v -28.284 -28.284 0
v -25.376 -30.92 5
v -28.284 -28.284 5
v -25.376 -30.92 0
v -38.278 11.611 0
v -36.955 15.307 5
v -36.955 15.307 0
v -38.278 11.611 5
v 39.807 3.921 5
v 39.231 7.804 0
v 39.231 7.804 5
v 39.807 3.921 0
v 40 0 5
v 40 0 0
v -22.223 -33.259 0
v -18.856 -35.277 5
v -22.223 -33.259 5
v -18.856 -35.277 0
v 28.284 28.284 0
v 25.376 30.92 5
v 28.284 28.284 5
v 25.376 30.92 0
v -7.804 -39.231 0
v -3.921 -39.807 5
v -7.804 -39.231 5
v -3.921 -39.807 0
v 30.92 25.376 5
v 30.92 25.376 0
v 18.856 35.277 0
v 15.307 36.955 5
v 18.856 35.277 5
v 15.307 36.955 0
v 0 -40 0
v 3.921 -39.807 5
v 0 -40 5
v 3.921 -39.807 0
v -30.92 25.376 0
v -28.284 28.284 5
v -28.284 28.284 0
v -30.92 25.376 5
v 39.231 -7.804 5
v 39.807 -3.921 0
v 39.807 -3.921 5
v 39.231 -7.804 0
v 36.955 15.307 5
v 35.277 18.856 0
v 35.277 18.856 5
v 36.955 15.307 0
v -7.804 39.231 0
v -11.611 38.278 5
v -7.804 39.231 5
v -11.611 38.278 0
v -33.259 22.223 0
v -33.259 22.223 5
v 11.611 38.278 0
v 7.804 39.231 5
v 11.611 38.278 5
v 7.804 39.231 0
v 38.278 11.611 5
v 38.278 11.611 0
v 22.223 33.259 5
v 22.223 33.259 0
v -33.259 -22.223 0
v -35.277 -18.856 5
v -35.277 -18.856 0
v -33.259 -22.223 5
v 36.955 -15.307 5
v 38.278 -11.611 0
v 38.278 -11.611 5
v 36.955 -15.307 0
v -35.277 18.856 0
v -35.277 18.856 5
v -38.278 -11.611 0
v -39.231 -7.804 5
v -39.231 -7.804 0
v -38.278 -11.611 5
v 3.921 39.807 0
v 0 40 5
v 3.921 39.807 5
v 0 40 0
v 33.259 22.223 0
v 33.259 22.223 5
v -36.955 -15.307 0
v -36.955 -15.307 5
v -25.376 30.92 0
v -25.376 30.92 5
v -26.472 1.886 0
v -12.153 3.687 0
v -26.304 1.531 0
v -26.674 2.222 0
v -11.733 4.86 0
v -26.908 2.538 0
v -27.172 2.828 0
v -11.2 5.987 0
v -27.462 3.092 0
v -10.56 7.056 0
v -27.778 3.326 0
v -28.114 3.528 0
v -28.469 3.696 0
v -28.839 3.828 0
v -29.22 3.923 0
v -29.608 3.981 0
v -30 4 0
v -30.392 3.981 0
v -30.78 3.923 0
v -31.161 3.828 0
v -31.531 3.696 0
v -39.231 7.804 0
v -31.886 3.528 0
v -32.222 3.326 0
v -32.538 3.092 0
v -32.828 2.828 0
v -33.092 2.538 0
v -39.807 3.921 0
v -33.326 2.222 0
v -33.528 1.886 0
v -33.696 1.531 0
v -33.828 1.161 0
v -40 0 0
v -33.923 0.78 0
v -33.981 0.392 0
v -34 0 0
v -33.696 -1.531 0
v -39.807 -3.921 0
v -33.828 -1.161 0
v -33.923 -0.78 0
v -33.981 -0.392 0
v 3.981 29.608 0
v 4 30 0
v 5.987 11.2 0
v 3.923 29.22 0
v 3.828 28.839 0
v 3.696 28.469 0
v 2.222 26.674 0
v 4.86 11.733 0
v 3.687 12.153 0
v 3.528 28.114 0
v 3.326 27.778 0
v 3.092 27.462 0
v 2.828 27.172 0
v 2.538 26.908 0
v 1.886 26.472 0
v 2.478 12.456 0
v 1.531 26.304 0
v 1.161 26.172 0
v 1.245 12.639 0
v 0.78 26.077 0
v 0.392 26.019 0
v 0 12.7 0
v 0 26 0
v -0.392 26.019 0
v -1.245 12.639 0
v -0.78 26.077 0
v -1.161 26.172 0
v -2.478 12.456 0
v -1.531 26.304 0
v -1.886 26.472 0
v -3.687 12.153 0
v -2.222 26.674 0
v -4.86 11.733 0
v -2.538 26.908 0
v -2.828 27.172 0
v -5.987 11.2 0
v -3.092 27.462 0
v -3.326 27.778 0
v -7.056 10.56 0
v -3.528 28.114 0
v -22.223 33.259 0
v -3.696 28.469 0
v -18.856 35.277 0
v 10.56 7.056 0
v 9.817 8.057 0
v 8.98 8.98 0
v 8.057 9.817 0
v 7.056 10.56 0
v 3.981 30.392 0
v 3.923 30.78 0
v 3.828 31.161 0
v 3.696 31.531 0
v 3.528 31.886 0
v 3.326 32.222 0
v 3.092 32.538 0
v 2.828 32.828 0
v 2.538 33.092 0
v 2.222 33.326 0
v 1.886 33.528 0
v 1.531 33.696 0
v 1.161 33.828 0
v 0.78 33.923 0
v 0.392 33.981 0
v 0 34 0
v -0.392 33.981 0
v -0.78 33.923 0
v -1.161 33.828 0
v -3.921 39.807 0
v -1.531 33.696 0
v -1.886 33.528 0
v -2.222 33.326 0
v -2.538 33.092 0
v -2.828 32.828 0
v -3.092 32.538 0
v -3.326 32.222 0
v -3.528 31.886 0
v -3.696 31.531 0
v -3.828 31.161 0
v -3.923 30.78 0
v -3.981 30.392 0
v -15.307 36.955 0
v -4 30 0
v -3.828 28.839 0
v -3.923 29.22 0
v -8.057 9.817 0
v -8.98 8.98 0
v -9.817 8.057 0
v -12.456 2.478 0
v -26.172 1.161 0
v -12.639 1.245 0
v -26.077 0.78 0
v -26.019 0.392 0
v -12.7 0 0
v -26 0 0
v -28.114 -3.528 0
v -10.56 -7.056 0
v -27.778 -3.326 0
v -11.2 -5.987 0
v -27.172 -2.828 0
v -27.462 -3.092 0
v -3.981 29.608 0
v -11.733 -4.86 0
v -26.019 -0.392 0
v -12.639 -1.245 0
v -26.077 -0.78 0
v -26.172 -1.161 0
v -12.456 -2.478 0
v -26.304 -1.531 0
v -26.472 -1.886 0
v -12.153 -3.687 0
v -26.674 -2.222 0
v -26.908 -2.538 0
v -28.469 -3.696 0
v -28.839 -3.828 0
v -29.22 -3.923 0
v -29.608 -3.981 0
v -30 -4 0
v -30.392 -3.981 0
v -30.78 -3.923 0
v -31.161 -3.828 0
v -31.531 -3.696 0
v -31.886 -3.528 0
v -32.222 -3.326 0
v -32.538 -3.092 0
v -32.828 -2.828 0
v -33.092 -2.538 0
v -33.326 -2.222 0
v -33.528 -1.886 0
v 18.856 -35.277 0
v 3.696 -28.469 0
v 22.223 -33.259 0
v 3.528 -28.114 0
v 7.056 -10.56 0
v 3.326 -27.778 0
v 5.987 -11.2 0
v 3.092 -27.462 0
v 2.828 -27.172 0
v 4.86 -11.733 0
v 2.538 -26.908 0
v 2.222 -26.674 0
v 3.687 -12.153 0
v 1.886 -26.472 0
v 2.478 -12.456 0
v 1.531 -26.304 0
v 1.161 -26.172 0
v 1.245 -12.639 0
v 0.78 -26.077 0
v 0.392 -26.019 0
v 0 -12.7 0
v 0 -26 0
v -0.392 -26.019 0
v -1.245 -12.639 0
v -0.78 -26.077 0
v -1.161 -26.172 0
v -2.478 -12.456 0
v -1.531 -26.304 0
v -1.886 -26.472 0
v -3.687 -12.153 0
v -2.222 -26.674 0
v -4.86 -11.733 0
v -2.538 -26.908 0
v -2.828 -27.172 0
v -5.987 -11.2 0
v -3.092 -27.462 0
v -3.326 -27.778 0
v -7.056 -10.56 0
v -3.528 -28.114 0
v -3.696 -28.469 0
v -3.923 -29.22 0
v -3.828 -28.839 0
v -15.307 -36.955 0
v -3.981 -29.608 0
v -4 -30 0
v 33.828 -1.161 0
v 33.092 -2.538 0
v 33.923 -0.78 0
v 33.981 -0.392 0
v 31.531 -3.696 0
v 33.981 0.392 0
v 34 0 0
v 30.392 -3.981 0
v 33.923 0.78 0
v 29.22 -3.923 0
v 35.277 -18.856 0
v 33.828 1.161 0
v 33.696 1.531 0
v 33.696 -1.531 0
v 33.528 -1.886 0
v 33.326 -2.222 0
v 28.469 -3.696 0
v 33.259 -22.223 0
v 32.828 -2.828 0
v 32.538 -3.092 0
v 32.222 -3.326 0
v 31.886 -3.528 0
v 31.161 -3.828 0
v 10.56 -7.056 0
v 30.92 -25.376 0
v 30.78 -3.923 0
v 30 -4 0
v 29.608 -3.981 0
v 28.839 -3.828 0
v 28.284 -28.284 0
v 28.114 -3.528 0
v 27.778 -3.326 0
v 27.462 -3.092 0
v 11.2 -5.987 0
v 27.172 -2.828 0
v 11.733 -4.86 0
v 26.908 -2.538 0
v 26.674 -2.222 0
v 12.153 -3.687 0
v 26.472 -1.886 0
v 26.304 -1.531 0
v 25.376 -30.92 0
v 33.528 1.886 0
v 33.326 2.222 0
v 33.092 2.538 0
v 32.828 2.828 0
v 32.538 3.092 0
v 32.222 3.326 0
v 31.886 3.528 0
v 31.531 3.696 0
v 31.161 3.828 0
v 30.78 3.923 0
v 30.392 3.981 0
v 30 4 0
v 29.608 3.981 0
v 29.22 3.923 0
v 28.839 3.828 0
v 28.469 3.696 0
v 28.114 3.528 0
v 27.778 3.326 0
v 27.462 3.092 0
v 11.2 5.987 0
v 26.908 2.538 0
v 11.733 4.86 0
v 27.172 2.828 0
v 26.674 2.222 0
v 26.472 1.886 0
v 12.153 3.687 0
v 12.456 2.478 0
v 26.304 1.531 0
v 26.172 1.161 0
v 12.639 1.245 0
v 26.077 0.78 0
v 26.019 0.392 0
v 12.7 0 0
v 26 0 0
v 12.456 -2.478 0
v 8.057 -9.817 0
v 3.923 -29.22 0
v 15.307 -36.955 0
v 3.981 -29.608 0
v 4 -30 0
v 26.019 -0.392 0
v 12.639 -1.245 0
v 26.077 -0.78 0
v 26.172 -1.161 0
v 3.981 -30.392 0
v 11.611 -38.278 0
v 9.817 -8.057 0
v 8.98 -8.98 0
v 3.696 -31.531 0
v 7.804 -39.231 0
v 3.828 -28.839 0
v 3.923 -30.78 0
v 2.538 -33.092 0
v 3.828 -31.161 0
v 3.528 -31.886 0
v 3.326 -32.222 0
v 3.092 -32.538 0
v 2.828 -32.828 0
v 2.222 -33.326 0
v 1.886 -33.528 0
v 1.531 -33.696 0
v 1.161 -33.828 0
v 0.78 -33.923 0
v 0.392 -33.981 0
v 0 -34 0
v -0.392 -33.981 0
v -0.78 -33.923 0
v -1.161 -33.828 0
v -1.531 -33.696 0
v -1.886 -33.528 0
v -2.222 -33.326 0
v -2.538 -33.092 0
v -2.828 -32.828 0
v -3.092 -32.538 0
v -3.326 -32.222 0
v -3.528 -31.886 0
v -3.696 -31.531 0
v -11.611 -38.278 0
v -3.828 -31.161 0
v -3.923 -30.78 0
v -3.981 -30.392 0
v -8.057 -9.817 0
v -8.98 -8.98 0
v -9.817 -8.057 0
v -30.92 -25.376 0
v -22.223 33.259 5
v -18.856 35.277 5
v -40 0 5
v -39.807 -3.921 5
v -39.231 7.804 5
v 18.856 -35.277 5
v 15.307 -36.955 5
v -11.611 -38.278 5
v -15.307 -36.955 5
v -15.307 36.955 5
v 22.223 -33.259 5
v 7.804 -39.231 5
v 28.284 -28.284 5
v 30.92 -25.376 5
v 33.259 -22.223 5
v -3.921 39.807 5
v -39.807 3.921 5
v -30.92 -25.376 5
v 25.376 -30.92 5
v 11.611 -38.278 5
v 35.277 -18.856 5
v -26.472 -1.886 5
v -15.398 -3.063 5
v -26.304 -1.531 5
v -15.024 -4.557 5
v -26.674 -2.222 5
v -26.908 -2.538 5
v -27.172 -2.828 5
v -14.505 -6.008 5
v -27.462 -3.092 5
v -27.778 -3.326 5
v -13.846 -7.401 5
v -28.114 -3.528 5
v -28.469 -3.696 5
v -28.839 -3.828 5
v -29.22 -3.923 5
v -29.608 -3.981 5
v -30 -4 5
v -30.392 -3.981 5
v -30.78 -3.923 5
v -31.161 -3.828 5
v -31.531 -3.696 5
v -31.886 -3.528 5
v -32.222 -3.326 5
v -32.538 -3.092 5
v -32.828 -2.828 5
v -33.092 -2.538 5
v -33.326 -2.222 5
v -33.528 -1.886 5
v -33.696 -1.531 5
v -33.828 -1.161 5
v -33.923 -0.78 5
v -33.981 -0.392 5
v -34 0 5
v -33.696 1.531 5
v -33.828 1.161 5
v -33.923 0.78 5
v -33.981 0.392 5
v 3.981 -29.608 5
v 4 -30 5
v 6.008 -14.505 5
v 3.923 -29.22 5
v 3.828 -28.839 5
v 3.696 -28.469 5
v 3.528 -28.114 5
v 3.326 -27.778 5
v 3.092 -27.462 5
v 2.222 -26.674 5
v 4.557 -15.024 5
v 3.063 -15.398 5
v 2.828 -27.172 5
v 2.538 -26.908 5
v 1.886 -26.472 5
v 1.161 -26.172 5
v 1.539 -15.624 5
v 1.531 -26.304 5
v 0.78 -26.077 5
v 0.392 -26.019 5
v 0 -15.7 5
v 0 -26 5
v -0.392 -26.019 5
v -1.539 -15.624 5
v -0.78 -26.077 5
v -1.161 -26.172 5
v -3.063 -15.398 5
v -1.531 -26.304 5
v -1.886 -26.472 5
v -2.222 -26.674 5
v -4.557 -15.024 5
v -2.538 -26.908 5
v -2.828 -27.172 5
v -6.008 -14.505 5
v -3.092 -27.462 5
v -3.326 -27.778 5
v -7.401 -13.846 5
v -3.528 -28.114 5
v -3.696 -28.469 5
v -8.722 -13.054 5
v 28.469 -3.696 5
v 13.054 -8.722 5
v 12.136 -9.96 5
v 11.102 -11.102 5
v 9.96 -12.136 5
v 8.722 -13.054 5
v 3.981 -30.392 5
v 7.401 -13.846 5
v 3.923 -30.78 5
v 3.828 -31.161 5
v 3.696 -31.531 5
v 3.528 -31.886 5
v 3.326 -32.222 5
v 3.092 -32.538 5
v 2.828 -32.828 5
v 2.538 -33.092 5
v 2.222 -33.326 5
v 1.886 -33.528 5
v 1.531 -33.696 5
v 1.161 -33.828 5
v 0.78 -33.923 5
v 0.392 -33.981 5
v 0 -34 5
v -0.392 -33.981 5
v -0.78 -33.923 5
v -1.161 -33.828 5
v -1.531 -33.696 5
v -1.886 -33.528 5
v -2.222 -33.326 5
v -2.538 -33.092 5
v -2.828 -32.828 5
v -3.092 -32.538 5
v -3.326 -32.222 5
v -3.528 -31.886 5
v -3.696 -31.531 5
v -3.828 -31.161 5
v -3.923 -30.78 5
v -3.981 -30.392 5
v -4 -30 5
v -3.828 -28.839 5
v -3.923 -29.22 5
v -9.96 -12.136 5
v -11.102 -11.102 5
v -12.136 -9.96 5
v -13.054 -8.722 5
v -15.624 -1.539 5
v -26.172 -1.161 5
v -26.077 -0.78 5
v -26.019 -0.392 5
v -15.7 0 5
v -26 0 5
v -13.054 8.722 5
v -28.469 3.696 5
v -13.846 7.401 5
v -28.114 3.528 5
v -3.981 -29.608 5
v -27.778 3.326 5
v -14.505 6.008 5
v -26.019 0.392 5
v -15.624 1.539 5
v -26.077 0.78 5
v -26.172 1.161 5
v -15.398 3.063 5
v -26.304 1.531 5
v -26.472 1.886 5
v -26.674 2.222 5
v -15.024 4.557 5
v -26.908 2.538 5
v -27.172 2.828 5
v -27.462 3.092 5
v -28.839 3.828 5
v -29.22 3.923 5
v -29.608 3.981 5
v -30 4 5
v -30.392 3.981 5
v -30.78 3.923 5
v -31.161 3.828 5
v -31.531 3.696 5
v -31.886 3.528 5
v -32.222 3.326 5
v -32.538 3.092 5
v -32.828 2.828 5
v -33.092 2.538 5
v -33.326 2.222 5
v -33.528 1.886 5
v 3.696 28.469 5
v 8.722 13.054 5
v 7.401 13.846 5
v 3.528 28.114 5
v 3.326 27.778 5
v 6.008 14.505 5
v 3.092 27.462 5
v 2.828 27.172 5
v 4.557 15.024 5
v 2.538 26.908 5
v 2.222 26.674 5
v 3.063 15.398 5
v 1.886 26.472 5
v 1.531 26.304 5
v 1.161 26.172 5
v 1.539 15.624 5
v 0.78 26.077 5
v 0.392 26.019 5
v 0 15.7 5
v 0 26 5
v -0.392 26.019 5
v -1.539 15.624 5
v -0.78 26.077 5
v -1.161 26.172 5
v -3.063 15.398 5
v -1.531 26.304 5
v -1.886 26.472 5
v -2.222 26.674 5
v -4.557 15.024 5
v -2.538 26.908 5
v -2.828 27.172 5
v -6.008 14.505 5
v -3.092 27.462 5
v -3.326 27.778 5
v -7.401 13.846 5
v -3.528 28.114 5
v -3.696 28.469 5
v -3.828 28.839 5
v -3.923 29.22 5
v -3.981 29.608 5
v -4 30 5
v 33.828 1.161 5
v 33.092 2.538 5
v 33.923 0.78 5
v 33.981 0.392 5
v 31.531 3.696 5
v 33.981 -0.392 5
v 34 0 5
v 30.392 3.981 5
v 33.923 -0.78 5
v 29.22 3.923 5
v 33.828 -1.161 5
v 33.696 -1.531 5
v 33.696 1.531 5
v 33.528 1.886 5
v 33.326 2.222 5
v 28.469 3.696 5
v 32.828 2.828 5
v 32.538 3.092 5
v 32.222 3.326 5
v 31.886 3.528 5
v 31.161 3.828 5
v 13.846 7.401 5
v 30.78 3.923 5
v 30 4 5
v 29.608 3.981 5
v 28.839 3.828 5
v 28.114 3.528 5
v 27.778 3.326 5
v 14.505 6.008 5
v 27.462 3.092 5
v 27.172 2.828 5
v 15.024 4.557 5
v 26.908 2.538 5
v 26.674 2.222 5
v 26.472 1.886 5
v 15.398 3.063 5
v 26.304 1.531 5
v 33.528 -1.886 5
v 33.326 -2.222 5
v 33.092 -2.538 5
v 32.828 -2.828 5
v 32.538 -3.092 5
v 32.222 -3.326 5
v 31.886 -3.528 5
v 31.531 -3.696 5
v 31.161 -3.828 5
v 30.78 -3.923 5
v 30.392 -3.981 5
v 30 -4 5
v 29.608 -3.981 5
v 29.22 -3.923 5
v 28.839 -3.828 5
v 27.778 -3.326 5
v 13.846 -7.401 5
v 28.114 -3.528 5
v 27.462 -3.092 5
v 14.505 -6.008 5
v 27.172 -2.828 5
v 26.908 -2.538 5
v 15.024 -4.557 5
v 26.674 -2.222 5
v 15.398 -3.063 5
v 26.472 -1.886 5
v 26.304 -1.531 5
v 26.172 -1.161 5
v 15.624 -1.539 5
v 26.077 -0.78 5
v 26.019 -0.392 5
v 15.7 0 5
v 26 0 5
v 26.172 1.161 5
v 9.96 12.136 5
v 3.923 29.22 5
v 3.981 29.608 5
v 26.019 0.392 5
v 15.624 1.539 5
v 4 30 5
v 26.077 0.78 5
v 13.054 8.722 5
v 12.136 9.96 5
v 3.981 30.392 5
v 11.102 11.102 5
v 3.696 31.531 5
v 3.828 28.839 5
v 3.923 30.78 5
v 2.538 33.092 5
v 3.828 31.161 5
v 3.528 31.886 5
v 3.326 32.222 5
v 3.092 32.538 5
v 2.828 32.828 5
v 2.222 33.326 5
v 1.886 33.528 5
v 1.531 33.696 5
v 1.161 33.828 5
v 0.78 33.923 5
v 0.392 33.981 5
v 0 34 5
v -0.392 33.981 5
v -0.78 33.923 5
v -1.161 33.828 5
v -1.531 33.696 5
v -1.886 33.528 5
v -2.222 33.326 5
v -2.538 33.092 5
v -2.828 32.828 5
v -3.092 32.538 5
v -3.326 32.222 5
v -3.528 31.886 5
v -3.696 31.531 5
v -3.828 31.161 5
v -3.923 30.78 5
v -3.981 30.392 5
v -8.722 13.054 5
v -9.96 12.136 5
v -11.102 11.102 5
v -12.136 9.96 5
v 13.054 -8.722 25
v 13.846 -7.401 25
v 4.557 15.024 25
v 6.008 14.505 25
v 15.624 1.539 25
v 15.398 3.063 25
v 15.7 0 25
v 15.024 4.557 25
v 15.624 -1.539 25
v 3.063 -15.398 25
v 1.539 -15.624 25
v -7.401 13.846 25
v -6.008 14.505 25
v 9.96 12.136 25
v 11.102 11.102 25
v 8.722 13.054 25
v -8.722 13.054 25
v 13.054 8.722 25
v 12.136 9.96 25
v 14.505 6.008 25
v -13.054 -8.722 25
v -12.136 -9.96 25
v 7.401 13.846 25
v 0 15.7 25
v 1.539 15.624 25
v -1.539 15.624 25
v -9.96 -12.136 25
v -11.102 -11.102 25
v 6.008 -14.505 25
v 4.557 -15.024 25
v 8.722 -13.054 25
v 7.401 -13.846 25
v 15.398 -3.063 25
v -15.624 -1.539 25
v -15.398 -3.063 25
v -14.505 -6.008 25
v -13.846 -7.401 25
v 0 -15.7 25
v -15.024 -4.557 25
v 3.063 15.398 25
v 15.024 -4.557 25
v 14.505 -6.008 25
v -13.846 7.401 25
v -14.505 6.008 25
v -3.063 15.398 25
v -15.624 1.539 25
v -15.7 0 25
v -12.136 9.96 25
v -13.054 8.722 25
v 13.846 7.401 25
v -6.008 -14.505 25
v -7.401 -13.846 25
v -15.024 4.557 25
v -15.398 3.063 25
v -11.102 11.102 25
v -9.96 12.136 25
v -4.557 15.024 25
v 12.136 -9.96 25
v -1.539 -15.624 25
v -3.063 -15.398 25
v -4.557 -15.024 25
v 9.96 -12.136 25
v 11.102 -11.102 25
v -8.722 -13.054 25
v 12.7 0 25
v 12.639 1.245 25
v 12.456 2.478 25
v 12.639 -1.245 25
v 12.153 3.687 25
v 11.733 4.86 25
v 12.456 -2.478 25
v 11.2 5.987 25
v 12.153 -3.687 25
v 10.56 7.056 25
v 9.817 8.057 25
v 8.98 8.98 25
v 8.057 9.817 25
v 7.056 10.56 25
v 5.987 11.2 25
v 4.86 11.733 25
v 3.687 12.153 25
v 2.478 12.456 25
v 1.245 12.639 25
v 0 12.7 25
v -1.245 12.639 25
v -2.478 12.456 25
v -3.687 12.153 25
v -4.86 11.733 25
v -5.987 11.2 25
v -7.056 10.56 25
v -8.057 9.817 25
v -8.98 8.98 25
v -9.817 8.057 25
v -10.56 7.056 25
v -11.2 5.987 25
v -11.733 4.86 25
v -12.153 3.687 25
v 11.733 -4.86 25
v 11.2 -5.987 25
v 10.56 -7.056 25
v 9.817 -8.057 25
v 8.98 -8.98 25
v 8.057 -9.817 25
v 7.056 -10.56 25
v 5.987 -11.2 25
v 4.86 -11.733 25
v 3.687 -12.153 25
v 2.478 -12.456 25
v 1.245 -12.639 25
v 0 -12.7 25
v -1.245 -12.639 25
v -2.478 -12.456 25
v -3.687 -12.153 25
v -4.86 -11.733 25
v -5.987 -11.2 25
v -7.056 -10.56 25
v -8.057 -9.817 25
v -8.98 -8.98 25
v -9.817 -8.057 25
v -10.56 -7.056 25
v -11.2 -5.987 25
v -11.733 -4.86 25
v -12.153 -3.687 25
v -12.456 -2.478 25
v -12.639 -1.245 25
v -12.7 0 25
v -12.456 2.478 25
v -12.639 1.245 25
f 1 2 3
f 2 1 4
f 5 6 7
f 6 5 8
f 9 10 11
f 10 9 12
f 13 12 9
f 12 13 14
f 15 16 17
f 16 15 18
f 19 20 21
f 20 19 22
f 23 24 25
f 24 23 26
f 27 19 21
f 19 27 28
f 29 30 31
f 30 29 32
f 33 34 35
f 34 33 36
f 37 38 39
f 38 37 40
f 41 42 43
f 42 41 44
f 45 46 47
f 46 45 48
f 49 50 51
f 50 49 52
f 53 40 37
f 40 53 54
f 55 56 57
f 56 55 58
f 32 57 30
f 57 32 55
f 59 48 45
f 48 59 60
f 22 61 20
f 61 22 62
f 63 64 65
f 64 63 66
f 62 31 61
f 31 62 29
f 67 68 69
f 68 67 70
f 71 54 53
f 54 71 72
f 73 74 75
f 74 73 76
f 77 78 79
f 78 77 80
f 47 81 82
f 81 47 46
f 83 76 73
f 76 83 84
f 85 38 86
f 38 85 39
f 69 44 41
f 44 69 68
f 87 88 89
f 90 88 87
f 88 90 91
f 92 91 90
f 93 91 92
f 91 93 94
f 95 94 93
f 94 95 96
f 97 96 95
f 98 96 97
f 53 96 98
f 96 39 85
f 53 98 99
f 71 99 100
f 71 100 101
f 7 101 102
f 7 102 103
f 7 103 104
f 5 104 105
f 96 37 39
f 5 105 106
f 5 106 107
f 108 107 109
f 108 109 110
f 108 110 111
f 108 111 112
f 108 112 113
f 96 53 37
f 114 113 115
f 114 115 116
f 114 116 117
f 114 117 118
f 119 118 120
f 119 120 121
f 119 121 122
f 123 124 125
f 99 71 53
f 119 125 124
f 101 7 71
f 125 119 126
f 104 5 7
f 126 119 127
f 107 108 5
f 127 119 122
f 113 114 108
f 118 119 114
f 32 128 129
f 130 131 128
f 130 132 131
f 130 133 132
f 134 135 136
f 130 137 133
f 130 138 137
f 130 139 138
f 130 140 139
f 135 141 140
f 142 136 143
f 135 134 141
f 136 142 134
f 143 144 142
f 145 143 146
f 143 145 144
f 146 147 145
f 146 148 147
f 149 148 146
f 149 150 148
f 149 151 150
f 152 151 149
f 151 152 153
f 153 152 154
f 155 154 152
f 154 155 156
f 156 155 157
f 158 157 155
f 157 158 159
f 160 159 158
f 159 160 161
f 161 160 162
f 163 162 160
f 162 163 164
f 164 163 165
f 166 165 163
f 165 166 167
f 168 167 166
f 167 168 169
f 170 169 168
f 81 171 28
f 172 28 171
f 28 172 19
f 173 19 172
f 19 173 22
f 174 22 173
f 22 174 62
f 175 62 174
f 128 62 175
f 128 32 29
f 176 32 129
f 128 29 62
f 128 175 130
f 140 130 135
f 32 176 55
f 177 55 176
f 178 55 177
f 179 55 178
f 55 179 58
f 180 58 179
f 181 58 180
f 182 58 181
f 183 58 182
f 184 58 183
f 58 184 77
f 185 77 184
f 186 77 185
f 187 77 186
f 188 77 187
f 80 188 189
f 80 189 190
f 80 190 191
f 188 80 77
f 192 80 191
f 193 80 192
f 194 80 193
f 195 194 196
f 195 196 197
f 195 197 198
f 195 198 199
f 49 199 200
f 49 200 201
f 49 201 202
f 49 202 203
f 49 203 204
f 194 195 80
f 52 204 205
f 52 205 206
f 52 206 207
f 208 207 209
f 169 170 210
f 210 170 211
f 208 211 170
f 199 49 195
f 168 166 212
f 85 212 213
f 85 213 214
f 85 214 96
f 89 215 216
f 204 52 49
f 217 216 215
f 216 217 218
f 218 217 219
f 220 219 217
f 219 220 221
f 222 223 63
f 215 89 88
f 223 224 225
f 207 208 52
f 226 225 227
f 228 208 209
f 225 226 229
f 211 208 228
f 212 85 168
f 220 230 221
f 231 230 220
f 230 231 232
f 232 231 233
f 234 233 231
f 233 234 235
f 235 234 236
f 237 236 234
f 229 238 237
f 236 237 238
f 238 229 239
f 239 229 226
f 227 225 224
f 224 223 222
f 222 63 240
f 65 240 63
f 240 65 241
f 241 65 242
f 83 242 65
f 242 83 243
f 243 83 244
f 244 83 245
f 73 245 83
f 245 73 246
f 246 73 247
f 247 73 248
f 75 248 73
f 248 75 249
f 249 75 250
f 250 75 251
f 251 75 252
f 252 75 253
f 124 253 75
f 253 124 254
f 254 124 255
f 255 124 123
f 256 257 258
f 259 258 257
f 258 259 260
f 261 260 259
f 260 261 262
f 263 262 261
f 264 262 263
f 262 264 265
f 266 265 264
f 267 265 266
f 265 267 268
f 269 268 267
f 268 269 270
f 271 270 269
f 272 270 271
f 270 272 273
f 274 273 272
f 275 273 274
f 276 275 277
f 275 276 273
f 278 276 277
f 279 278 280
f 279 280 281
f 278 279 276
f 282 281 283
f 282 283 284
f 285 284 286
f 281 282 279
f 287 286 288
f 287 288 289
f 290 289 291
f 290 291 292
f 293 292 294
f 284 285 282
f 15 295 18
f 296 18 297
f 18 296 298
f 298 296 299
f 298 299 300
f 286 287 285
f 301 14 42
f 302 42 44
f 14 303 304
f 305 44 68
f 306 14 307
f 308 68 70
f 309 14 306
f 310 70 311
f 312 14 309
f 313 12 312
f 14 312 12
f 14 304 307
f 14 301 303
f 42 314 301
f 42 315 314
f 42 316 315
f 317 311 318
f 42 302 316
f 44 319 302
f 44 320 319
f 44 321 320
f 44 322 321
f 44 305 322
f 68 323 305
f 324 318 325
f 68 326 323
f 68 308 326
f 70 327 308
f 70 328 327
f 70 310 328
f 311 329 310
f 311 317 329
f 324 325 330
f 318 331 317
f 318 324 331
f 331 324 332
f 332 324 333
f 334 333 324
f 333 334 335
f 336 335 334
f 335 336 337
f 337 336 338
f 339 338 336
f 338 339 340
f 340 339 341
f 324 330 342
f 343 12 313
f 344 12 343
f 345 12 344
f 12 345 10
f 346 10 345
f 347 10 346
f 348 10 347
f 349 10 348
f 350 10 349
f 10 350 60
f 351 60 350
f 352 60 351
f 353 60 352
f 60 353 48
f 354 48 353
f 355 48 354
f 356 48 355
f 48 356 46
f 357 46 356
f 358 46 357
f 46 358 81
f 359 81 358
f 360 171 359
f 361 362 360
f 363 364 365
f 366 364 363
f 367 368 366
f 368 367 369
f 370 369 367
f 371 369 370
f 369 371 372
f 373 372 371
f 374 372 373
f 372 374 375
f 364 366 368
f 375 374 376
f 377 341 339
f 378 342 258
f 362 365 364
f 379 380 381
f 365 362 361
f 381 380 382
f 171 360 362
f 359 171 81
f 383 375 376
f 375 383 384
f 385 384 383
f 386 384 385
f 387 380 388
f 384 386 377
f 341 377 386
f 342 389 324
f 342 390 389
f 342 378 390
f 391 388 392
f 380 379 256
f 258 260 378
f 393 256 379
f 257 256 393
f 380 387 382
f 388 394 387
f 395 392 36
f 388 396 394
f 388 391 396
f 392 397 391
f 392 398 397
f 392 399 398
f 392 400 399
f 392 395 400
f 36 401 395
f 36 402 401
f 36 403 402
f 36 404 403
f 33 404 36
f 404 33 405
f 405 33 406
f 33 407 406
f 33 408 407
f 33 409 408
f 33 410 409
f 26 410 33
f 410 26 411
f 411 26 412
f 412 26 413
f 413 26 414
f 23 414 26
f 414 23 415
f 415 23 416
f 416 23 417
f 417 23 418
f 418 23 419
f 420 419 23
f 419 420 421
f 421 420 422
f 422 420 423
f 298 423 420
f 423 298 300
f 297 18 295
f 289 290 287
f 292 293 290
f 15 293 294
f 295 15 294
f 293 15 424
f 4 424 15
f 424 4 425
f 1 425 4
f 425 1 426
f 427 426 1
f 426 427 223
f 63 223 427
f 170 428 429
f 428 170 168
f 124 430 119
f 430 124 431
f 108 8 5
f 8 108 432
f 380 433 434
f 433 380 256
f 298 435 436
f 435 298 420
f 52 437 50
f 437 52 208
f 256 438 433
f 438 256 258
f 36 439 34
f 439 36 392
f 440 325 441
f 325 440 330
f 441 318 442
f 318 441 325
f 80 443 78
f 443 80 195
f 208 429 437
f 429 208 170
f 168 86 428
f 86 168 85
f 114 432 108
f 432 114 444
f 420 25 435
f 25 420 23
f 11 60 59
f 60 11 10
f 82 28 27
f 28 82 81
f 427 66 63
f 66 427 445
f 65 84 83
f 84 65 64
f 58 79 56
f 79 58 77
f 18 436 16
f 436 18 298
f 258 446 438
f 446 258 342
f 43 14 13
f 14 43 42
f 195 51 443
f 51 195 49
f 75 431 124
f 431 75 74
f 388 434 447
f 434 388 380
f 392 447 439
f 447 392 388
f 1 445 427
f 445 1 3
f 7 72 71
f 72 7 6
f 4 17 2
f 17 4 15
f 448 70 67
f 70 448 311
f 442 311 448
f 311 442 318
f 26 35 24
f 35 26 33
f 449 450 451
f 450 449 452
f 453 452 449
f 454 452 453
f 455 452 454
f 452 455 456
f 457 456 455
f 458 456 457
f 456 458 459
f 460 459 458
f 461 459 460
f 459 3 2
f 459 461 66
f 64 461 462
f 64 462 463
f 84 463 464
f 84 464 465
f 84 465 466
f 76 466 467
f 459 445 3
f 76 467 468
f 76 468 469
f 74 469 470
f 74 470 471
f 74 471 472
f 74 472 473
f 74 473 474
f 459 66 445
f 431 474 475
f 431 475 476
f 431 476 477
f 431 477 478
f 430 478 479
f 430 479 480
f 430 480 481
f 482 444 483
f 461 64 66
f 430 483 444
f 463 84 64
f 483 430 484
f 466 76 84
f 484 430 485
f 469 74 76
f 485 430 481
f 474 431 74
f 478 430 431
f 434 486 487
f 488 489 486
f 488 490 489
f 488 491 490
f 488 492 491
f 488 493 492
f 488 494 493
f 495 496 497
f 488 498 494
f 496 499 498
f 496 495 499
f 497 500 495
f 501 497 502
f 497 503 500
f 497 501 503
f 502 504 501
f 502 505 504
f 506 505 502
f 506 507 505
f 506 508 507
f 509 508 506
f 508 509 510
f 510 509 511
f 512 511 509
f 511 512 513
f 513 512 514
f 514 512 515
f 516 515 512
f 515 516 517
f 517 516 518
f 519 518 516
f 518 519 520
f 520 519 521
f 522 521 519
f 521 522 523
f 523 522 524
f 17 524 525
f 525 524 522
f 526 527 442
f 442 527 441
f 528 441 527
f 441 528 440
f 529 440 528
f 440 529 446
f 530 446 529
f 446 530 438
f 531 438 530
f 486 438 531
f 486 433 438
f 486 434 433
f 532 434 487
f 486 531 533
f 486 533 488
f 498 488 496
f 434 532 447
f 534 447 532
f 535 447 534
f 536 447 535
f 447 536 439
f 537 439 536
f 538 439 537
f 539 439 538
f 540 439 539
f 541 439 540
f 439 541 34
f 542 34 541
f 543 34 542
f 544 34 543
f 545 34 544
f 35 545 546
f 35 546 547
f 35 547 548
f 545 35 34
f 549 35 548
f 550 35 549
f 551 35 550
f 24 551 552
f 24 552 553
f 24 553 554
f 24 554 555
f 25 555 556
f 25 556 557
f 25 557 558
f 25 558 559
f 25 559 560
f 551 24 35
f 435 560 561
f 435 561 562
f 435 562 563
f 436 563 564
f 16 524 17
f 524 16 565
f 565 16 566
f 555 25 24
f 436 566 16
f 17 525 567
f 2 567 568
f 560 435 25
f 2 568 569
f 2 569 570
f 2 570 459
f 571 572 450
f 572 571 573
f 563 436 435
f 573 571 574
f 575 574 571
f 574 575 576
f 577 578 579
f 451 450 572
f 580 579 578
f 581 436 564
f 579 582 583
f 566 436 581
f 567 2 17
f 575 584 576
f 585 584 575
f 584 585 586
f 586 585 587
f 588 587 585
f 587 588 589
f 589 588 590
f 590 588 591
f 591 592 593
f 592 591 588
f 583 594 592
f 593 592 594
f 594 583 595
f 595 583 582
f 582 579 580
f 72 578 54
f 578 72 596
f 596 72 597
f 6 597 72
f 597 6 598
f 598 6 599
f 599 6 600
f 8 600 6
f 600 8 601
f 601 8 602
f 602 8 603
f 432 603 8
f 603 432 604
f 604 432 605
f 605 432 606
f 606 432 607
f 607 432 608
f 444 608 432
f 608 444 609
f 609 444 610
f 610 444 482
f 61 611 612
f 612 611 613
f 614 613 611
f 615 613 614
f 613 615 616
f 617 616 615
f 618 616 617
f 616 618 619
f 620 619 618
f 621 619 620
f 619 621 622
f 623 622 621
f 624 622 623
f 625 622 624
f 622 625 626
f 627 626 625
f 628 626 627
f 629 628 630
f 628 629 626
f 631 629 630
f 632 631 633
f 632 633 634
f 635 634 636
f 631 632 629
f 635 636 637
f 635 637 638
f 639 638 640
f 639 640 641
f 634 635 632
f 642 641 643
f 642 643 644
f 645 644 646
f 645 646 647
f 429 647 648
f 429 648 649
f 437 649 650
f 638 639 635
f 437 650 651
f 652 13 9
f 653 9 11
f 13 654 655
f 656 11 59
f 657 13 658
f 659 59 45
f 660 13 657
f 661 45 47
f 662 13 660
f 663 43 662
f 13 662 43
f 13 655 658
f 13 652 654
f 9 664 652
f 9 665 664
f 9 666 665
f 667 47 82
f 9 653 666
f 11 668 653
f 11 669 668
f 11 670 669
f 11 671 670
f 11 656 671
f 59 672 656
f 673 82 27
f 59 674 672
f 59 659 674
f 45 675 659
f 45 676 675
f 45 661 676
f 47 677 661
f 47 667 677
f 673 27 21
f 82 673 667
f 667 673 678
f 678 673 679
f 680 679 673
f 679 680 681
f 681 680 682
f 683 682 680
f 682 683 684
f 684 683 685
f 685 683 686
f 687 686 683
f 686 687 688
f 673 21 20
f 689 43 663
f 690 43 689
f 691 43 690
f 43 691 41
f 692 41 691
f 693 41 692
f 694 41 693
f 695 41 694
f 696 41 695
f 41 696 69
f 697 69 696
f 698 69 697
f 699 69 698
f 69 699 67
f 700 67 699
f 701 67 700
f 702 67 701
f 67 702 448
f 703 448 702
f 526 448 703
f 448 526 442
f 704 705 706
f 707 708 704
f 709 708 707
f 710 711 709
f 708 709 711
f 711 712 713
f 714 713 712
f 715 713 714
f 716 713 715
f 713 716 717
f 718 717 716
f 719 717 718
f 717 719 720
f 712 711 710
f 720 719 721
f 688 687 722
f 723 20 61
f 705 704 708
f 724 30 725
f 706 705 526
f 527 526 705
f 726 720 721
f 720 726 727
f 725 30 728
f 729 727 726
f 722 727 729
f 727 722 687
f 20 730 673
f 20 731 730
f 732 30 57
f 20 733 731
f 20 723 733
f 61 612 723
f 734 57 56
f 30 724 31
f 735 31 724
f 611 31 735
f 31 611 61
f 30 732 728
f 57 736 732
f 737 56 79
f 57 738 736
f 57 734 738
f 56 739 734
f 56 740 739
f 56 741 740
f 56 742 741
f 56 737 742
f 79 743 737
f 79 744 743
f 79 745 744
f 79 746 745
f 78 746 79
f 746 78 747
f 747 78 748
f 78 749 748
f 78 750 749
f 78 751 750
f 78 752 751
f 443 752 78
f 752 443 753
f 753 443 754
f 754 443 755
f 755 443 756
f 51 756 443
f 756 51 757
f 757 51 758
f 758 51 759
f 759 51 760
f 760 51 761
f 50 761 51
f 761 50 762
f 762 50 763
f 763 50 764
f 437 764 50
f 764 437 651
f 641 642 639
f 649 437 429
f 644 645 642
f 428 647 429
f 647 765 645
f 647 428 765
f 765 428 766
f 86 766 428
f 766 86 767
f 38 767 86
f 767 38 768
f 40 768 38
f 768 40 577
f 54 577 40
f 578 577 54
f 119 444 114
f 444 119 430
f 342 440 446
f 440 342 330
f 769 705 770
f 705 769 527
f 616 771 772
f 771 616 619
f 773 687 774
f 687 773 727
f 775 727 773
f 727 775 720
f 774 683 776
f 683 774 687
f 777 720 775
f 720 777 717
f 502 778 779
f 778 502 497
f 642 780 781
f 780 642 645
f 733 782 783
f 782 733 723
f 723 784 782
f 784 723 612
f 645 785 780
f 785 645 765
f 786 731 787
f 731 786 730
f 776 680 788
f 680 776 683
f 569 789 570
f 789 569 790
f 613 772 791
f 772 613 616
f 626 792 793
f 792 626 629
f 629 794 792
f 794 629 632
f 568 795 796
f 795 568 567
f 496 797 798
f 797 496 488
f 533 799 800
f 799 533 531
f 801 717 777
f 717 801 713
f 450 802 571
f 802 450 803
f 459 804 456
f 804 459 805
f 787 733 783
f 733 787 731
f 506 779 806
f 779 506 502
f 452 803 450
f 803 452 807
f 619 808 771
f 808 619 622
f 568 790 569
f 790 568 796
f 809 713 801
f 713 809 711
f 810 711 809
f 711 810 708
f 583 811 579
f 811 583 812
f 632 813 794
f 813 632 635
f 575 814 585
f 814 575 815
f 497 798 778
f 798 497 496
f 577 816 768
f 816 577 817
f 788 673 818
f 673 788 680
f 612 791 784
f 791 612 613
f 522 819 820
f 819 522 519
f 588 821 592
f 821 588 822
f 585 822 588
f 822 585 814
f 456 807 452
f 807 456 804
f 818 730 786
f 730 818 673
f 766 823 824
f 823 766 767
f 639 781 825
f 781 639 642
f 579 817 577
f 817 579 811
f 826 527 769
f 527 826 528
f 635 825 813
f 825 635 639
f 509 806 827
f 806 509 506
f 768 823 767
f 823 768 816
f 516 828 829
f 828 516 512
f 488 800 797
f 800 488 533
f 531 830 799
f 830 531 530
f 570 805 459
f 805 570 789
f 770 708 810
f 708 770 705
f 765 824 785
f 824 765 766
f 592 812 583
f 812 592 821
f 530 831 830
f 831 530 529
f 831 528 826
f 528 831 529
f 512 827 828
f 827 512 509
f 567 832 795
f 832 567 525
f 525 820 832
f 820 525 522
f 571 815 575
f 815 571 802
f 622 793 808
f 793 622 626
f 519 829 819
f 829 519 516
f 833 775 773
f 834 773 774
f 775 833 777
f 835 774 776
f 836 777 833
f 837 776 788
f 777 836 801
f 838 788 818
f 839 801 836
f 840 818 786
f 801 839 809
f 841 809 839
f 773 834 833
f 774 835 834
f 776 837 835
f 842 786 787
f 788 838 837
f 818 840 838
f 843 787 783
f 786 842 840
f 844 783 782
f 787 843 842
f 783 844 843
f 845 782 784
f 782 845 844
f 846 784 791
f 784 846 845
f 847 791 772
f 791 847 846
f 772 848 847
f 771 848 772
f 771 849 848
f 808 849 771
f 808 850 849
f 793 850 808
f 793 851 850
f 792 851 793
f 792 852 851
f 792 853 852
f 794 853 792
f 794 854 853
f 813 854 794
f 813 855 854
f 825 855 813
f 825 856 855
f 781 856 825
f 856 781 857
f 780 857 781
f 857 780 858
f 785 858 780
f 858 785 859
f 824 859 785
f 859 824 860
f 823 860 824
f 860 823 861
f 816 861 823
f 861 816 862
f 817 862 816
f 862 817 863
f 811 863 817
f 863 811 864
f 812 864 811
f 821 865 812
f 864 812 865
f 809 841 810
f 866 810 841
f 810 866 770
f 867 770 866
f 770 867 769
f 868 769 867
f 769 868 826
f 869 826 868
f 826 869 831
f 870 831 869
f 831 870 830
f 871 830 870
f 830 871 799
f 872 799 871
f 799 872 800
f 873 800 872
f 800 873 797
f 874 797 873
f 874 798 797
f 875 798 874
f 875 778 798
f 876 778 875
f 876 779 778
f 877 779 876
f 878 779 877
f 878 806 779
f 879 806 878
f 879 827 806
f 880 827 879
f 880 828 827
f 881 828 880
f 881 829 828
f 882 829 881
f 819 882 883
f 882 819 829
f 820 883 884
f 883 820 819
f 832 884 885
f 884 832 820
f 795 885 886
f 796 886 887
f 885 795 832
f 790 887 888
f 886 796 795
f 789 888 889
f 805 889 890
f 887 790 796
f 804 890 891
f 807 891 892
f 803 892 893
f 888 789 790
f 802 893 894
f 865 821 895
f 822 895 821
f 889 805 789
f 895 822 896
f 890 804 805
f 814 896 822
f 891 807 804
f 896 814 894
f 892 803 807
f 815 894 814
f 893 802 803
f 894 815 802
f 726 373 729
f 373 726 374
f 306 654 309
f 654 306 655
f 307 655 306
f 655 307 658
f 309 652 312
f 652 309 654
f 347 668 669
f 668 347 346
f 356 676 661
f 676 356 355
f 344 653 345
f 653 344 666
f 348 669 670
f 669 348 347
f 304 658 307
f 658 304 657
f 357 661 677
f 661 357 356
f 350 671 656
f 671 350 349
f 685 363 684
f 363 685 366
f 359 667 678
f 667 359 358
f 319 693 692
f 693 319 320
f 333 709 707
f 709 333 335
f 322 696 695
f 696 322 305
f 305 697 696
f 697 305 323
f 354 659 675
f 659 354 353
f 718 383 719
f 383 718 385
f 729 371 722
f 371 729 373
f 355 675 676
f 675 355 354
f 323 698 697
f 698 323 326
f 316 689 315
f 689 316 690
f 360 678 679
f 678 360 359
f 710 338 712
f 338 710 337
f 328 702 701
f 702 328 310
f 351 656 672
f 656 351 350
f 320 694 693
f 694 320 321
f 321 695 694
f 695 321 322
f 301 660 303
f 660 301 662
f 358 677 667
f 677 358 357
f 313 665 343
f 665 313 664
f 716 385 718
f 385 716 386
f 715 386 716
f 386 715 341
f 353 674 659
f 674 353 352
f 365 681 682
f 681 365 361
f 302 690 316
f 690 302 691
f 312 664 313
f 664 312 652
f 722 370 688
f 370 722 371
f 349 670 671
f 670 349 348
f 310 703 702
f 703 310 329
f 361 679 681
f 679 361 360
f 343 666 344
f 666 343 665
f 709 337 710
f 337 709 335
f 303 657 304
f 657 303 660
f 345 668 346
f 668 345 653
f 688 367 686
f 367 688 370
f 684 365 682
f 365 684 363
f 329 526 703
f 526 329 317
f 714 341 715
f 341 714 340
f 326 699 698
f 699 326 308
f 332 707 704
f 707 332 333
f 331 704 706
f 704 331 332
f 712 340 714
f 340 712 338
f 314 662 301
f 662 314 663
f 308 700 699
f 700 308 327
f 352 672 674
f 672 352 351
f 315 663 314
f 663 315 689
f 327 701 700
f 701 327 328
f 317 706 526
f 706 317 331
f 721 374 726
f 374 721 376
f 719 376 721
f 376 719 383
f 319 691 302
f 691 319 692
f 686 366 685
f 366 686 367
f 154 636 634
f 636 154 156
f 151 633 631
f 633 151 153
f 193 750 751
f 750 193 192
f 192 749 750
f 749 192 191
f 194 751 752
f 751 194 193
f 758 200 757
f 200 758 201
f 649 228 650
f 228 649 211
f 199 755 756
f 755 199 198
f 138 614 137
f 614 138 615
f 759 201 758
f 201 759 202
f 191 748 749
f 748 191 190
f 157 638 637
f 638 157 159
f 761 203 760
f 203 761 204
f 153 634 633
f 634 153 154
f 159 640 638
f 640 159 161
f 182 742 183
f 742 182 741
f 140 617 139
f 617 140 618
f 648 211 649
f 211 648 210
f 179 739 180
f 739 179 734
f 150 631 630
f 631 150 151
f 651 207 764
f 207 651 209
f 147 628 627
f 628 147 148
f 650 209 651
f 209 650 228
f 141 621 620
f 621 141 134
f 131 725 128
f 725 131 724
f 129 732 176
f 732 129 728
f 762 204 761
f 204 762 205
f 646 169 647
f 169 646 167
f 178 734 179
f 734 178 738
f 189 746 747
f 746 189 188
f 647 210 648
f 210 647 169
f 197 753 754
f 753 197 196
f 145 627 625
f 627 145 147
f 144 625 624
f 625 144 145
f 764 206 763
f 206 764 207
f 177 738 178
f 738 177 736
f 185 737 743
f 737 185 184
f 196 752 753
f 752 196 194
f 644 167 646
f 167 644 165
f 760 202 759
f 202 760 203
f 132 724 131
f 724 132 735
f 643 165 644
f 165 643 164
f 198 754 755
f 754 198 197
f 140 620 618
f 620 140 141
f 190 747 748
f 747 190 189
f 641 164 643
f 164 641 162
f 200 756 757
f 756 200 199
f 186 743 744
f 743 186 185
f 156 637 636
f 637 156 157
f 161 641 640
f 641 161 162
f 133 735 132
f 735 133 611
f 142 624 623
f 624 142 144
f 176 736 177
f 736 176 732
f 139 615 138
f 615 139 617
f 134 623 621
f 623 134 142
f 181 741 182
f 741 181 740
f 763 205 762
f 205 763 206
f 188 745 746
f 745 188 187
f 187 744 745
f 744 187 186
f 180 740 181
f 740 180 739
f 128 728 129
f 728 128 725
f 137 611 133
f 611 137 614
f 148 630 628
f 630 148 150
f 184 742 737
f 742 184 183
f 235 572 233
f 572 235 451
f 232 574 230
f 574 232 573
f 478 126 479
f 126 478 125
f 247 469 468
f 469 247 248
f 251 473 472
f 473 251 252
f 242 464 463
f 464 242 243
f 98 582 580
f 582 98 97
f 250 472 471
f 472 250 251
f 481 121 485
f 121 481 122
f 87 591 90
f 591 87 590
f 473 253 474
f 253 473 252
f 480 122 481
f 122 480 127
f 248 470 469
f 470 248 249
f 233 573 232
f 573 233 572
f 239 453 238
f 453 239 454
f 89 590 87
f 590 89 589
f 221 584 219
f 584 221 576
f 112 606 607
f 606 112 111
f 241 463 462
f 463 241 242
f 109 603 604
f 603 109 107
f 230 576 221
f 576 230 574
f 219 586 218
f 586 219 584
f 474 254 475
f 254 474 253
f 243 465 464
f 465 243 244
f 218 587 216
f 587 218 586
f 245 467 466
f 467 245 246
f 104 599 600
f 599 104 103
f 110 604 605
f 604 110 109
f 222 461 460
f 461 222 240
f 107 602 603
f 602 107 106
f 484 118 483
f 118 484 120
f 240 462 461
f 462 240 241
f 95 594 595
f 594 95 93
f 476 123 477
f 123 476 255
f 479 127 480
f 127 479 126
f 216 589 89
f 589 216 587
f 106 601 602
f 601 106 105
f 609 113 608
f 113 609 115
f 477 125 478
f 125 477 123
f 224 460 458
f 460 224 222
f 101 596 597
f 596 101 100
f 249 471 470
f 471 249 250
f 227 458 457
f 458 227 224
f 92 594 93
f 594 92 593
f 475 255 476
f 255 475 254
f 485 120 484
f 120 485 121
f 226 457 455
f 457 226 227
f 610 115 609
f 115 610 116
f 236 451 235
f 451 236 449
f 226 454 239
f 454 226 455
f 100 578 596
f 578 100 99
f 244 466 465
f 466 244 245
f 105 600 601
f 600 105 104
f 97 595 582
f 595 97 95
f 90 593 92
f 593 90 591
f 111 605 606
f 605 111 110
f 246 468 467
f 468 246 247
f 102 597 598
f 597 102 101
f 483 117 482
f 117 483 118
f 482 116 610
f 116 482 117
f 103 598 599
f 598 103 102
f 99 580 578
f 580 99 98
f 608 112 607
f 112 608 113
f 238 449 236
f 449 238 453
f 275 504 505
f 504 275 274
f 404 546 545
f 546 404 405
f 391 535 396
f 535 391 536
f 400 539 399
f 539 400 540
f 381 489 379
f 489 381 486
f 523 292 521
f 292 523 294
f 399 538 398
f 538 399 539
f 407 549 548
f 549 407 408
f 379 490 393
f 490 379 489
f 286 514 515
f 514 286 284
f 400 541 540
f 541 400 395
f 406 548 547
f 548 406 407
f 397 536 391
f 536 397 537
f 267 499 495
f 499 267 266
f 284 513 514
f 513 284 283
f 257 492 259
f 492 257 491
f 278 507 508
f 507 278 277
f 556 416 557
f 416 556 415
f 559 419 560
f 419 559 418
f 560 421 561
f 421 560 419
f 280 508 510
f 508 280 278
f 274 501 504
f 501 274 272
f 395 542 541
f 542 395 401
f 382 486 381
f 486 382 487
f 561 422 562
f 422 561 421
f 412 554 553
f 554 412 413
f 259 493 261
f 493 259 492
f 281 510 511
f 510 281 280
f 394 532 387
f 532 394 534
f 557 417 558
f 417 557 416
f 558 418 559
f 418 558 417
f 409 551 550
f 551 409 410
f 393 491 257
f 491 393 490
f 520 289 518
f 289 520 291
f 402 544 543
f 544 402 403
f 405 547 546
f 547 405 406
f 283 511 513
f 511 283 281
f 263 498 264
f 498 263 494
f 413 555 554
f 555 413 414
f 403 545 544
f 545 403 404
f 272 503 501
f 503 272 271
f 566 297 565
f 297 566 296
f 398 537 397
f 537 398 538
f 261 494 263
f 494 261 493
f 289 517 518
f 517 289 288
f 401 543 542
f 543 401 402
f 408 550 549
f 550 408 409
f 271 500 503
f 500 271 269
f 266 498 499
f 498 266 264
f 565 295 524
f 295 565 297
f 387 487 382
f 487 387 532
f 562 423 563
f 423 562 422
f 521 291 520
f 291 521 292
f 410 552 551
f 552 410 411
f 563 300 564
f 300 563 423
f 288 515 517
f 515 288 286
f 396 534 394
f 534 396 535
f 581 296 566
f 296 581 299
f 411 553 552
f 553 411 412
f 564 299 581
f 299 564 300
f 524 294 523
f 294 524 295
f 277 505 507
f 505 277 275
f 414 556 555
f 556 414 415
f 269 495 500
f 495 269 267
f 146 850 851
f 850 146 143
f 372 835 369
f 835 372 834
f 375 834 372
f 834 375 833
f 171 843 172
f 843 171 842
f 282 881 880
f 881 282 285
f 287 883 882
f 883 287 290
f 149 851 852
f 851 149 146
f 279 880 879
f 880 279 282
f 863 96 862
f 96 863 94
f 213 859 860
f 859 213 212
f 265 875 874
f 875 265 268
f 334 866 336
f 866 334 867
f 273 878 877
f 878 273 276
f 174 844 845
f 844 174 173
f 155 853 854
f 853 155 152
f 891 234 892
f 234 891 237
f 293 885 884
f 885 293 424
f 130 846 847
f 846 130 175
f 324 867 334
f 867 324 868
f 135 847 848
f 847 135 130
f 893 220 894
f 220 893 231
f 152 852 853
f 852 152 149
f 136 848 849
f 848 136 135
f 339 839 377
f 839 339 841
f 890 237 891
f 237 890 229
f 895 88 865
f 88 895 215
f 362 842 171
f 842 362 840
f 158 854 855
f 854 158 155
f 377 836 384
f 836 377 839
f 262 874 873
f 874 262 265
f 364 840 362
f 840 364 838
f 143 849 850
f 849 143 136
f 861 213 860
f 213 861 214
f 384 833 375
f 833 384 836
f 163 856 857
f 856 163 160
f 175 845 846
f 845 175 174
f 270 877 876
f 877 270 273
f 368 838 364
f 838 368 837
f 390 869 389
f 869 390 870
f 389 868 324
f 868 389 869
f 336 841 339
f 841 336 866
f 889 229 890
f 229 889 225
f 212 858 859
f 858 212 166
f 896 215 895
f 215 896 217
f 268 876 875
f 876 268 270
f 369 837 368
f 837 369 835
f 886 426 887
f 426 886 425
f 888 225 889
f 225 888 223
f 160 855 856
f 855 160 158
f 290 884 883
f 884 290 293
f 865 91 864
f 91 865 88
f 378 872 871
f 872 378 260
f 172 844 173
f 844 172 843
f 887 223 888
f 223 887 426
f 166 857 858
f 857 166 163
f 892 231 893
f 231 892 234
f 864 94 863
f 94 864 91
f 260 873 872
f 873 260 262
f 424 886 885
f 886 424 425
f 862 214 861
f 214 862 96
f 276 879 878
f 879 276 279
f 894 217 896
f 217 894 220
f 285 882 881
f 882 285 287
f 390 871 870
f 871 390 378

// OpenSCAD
// Parametric Pipe Flange (mounting plate with bolt holes)
// Parameters are injected via OpenSCAD -D flags

// Pipe inner diameter (mm)
pipe_id = 25.4;
// Wall thickness (mm)
wall_thickness = 3;
// Flange outer diameter (mm)
flange_od = 80;
// Flange plate thickness (mm)
plate_thickness = 5;
// Stub length extending from plate (mm)
stub_length = 20;
// Number of bolt holes
bolt_count = 4;
// Bolt hole diameter (mm)
bolt_diameter = 8;
// Bolt circle diameter (mm) - center-to-center of bolt holes
bolt_circle = 60;
// Resolution
$fn = 64;

pipe_od = pipe_id + 2 * wall_thickness;

module flange() {
    difference() {
        union() {
            // Flange plate
            cylinder(h = plate_thickness, d = flange_od);

            // Pipe stub
            translate([0, 0, plate_thickness])
                cylinder(h = stub_length, d = pipe_od);
        }

        // Center bore through everything
        translate([0, 0, -0.1])
            cylinder(h = plate_thickness + stub_length + 0.2, d = pipe_id);

        // Bolt holes
        for (i = [0 : bolt_count - 1]) {
            rotate([0, 0, i * 360 / bolt_count])
                translate([bolt_circle / 2, 0, -0.1])
                    cylinder(h = plate_thickness + 0.2, d = bolt_diameter);
        }
    }
}

flange();
